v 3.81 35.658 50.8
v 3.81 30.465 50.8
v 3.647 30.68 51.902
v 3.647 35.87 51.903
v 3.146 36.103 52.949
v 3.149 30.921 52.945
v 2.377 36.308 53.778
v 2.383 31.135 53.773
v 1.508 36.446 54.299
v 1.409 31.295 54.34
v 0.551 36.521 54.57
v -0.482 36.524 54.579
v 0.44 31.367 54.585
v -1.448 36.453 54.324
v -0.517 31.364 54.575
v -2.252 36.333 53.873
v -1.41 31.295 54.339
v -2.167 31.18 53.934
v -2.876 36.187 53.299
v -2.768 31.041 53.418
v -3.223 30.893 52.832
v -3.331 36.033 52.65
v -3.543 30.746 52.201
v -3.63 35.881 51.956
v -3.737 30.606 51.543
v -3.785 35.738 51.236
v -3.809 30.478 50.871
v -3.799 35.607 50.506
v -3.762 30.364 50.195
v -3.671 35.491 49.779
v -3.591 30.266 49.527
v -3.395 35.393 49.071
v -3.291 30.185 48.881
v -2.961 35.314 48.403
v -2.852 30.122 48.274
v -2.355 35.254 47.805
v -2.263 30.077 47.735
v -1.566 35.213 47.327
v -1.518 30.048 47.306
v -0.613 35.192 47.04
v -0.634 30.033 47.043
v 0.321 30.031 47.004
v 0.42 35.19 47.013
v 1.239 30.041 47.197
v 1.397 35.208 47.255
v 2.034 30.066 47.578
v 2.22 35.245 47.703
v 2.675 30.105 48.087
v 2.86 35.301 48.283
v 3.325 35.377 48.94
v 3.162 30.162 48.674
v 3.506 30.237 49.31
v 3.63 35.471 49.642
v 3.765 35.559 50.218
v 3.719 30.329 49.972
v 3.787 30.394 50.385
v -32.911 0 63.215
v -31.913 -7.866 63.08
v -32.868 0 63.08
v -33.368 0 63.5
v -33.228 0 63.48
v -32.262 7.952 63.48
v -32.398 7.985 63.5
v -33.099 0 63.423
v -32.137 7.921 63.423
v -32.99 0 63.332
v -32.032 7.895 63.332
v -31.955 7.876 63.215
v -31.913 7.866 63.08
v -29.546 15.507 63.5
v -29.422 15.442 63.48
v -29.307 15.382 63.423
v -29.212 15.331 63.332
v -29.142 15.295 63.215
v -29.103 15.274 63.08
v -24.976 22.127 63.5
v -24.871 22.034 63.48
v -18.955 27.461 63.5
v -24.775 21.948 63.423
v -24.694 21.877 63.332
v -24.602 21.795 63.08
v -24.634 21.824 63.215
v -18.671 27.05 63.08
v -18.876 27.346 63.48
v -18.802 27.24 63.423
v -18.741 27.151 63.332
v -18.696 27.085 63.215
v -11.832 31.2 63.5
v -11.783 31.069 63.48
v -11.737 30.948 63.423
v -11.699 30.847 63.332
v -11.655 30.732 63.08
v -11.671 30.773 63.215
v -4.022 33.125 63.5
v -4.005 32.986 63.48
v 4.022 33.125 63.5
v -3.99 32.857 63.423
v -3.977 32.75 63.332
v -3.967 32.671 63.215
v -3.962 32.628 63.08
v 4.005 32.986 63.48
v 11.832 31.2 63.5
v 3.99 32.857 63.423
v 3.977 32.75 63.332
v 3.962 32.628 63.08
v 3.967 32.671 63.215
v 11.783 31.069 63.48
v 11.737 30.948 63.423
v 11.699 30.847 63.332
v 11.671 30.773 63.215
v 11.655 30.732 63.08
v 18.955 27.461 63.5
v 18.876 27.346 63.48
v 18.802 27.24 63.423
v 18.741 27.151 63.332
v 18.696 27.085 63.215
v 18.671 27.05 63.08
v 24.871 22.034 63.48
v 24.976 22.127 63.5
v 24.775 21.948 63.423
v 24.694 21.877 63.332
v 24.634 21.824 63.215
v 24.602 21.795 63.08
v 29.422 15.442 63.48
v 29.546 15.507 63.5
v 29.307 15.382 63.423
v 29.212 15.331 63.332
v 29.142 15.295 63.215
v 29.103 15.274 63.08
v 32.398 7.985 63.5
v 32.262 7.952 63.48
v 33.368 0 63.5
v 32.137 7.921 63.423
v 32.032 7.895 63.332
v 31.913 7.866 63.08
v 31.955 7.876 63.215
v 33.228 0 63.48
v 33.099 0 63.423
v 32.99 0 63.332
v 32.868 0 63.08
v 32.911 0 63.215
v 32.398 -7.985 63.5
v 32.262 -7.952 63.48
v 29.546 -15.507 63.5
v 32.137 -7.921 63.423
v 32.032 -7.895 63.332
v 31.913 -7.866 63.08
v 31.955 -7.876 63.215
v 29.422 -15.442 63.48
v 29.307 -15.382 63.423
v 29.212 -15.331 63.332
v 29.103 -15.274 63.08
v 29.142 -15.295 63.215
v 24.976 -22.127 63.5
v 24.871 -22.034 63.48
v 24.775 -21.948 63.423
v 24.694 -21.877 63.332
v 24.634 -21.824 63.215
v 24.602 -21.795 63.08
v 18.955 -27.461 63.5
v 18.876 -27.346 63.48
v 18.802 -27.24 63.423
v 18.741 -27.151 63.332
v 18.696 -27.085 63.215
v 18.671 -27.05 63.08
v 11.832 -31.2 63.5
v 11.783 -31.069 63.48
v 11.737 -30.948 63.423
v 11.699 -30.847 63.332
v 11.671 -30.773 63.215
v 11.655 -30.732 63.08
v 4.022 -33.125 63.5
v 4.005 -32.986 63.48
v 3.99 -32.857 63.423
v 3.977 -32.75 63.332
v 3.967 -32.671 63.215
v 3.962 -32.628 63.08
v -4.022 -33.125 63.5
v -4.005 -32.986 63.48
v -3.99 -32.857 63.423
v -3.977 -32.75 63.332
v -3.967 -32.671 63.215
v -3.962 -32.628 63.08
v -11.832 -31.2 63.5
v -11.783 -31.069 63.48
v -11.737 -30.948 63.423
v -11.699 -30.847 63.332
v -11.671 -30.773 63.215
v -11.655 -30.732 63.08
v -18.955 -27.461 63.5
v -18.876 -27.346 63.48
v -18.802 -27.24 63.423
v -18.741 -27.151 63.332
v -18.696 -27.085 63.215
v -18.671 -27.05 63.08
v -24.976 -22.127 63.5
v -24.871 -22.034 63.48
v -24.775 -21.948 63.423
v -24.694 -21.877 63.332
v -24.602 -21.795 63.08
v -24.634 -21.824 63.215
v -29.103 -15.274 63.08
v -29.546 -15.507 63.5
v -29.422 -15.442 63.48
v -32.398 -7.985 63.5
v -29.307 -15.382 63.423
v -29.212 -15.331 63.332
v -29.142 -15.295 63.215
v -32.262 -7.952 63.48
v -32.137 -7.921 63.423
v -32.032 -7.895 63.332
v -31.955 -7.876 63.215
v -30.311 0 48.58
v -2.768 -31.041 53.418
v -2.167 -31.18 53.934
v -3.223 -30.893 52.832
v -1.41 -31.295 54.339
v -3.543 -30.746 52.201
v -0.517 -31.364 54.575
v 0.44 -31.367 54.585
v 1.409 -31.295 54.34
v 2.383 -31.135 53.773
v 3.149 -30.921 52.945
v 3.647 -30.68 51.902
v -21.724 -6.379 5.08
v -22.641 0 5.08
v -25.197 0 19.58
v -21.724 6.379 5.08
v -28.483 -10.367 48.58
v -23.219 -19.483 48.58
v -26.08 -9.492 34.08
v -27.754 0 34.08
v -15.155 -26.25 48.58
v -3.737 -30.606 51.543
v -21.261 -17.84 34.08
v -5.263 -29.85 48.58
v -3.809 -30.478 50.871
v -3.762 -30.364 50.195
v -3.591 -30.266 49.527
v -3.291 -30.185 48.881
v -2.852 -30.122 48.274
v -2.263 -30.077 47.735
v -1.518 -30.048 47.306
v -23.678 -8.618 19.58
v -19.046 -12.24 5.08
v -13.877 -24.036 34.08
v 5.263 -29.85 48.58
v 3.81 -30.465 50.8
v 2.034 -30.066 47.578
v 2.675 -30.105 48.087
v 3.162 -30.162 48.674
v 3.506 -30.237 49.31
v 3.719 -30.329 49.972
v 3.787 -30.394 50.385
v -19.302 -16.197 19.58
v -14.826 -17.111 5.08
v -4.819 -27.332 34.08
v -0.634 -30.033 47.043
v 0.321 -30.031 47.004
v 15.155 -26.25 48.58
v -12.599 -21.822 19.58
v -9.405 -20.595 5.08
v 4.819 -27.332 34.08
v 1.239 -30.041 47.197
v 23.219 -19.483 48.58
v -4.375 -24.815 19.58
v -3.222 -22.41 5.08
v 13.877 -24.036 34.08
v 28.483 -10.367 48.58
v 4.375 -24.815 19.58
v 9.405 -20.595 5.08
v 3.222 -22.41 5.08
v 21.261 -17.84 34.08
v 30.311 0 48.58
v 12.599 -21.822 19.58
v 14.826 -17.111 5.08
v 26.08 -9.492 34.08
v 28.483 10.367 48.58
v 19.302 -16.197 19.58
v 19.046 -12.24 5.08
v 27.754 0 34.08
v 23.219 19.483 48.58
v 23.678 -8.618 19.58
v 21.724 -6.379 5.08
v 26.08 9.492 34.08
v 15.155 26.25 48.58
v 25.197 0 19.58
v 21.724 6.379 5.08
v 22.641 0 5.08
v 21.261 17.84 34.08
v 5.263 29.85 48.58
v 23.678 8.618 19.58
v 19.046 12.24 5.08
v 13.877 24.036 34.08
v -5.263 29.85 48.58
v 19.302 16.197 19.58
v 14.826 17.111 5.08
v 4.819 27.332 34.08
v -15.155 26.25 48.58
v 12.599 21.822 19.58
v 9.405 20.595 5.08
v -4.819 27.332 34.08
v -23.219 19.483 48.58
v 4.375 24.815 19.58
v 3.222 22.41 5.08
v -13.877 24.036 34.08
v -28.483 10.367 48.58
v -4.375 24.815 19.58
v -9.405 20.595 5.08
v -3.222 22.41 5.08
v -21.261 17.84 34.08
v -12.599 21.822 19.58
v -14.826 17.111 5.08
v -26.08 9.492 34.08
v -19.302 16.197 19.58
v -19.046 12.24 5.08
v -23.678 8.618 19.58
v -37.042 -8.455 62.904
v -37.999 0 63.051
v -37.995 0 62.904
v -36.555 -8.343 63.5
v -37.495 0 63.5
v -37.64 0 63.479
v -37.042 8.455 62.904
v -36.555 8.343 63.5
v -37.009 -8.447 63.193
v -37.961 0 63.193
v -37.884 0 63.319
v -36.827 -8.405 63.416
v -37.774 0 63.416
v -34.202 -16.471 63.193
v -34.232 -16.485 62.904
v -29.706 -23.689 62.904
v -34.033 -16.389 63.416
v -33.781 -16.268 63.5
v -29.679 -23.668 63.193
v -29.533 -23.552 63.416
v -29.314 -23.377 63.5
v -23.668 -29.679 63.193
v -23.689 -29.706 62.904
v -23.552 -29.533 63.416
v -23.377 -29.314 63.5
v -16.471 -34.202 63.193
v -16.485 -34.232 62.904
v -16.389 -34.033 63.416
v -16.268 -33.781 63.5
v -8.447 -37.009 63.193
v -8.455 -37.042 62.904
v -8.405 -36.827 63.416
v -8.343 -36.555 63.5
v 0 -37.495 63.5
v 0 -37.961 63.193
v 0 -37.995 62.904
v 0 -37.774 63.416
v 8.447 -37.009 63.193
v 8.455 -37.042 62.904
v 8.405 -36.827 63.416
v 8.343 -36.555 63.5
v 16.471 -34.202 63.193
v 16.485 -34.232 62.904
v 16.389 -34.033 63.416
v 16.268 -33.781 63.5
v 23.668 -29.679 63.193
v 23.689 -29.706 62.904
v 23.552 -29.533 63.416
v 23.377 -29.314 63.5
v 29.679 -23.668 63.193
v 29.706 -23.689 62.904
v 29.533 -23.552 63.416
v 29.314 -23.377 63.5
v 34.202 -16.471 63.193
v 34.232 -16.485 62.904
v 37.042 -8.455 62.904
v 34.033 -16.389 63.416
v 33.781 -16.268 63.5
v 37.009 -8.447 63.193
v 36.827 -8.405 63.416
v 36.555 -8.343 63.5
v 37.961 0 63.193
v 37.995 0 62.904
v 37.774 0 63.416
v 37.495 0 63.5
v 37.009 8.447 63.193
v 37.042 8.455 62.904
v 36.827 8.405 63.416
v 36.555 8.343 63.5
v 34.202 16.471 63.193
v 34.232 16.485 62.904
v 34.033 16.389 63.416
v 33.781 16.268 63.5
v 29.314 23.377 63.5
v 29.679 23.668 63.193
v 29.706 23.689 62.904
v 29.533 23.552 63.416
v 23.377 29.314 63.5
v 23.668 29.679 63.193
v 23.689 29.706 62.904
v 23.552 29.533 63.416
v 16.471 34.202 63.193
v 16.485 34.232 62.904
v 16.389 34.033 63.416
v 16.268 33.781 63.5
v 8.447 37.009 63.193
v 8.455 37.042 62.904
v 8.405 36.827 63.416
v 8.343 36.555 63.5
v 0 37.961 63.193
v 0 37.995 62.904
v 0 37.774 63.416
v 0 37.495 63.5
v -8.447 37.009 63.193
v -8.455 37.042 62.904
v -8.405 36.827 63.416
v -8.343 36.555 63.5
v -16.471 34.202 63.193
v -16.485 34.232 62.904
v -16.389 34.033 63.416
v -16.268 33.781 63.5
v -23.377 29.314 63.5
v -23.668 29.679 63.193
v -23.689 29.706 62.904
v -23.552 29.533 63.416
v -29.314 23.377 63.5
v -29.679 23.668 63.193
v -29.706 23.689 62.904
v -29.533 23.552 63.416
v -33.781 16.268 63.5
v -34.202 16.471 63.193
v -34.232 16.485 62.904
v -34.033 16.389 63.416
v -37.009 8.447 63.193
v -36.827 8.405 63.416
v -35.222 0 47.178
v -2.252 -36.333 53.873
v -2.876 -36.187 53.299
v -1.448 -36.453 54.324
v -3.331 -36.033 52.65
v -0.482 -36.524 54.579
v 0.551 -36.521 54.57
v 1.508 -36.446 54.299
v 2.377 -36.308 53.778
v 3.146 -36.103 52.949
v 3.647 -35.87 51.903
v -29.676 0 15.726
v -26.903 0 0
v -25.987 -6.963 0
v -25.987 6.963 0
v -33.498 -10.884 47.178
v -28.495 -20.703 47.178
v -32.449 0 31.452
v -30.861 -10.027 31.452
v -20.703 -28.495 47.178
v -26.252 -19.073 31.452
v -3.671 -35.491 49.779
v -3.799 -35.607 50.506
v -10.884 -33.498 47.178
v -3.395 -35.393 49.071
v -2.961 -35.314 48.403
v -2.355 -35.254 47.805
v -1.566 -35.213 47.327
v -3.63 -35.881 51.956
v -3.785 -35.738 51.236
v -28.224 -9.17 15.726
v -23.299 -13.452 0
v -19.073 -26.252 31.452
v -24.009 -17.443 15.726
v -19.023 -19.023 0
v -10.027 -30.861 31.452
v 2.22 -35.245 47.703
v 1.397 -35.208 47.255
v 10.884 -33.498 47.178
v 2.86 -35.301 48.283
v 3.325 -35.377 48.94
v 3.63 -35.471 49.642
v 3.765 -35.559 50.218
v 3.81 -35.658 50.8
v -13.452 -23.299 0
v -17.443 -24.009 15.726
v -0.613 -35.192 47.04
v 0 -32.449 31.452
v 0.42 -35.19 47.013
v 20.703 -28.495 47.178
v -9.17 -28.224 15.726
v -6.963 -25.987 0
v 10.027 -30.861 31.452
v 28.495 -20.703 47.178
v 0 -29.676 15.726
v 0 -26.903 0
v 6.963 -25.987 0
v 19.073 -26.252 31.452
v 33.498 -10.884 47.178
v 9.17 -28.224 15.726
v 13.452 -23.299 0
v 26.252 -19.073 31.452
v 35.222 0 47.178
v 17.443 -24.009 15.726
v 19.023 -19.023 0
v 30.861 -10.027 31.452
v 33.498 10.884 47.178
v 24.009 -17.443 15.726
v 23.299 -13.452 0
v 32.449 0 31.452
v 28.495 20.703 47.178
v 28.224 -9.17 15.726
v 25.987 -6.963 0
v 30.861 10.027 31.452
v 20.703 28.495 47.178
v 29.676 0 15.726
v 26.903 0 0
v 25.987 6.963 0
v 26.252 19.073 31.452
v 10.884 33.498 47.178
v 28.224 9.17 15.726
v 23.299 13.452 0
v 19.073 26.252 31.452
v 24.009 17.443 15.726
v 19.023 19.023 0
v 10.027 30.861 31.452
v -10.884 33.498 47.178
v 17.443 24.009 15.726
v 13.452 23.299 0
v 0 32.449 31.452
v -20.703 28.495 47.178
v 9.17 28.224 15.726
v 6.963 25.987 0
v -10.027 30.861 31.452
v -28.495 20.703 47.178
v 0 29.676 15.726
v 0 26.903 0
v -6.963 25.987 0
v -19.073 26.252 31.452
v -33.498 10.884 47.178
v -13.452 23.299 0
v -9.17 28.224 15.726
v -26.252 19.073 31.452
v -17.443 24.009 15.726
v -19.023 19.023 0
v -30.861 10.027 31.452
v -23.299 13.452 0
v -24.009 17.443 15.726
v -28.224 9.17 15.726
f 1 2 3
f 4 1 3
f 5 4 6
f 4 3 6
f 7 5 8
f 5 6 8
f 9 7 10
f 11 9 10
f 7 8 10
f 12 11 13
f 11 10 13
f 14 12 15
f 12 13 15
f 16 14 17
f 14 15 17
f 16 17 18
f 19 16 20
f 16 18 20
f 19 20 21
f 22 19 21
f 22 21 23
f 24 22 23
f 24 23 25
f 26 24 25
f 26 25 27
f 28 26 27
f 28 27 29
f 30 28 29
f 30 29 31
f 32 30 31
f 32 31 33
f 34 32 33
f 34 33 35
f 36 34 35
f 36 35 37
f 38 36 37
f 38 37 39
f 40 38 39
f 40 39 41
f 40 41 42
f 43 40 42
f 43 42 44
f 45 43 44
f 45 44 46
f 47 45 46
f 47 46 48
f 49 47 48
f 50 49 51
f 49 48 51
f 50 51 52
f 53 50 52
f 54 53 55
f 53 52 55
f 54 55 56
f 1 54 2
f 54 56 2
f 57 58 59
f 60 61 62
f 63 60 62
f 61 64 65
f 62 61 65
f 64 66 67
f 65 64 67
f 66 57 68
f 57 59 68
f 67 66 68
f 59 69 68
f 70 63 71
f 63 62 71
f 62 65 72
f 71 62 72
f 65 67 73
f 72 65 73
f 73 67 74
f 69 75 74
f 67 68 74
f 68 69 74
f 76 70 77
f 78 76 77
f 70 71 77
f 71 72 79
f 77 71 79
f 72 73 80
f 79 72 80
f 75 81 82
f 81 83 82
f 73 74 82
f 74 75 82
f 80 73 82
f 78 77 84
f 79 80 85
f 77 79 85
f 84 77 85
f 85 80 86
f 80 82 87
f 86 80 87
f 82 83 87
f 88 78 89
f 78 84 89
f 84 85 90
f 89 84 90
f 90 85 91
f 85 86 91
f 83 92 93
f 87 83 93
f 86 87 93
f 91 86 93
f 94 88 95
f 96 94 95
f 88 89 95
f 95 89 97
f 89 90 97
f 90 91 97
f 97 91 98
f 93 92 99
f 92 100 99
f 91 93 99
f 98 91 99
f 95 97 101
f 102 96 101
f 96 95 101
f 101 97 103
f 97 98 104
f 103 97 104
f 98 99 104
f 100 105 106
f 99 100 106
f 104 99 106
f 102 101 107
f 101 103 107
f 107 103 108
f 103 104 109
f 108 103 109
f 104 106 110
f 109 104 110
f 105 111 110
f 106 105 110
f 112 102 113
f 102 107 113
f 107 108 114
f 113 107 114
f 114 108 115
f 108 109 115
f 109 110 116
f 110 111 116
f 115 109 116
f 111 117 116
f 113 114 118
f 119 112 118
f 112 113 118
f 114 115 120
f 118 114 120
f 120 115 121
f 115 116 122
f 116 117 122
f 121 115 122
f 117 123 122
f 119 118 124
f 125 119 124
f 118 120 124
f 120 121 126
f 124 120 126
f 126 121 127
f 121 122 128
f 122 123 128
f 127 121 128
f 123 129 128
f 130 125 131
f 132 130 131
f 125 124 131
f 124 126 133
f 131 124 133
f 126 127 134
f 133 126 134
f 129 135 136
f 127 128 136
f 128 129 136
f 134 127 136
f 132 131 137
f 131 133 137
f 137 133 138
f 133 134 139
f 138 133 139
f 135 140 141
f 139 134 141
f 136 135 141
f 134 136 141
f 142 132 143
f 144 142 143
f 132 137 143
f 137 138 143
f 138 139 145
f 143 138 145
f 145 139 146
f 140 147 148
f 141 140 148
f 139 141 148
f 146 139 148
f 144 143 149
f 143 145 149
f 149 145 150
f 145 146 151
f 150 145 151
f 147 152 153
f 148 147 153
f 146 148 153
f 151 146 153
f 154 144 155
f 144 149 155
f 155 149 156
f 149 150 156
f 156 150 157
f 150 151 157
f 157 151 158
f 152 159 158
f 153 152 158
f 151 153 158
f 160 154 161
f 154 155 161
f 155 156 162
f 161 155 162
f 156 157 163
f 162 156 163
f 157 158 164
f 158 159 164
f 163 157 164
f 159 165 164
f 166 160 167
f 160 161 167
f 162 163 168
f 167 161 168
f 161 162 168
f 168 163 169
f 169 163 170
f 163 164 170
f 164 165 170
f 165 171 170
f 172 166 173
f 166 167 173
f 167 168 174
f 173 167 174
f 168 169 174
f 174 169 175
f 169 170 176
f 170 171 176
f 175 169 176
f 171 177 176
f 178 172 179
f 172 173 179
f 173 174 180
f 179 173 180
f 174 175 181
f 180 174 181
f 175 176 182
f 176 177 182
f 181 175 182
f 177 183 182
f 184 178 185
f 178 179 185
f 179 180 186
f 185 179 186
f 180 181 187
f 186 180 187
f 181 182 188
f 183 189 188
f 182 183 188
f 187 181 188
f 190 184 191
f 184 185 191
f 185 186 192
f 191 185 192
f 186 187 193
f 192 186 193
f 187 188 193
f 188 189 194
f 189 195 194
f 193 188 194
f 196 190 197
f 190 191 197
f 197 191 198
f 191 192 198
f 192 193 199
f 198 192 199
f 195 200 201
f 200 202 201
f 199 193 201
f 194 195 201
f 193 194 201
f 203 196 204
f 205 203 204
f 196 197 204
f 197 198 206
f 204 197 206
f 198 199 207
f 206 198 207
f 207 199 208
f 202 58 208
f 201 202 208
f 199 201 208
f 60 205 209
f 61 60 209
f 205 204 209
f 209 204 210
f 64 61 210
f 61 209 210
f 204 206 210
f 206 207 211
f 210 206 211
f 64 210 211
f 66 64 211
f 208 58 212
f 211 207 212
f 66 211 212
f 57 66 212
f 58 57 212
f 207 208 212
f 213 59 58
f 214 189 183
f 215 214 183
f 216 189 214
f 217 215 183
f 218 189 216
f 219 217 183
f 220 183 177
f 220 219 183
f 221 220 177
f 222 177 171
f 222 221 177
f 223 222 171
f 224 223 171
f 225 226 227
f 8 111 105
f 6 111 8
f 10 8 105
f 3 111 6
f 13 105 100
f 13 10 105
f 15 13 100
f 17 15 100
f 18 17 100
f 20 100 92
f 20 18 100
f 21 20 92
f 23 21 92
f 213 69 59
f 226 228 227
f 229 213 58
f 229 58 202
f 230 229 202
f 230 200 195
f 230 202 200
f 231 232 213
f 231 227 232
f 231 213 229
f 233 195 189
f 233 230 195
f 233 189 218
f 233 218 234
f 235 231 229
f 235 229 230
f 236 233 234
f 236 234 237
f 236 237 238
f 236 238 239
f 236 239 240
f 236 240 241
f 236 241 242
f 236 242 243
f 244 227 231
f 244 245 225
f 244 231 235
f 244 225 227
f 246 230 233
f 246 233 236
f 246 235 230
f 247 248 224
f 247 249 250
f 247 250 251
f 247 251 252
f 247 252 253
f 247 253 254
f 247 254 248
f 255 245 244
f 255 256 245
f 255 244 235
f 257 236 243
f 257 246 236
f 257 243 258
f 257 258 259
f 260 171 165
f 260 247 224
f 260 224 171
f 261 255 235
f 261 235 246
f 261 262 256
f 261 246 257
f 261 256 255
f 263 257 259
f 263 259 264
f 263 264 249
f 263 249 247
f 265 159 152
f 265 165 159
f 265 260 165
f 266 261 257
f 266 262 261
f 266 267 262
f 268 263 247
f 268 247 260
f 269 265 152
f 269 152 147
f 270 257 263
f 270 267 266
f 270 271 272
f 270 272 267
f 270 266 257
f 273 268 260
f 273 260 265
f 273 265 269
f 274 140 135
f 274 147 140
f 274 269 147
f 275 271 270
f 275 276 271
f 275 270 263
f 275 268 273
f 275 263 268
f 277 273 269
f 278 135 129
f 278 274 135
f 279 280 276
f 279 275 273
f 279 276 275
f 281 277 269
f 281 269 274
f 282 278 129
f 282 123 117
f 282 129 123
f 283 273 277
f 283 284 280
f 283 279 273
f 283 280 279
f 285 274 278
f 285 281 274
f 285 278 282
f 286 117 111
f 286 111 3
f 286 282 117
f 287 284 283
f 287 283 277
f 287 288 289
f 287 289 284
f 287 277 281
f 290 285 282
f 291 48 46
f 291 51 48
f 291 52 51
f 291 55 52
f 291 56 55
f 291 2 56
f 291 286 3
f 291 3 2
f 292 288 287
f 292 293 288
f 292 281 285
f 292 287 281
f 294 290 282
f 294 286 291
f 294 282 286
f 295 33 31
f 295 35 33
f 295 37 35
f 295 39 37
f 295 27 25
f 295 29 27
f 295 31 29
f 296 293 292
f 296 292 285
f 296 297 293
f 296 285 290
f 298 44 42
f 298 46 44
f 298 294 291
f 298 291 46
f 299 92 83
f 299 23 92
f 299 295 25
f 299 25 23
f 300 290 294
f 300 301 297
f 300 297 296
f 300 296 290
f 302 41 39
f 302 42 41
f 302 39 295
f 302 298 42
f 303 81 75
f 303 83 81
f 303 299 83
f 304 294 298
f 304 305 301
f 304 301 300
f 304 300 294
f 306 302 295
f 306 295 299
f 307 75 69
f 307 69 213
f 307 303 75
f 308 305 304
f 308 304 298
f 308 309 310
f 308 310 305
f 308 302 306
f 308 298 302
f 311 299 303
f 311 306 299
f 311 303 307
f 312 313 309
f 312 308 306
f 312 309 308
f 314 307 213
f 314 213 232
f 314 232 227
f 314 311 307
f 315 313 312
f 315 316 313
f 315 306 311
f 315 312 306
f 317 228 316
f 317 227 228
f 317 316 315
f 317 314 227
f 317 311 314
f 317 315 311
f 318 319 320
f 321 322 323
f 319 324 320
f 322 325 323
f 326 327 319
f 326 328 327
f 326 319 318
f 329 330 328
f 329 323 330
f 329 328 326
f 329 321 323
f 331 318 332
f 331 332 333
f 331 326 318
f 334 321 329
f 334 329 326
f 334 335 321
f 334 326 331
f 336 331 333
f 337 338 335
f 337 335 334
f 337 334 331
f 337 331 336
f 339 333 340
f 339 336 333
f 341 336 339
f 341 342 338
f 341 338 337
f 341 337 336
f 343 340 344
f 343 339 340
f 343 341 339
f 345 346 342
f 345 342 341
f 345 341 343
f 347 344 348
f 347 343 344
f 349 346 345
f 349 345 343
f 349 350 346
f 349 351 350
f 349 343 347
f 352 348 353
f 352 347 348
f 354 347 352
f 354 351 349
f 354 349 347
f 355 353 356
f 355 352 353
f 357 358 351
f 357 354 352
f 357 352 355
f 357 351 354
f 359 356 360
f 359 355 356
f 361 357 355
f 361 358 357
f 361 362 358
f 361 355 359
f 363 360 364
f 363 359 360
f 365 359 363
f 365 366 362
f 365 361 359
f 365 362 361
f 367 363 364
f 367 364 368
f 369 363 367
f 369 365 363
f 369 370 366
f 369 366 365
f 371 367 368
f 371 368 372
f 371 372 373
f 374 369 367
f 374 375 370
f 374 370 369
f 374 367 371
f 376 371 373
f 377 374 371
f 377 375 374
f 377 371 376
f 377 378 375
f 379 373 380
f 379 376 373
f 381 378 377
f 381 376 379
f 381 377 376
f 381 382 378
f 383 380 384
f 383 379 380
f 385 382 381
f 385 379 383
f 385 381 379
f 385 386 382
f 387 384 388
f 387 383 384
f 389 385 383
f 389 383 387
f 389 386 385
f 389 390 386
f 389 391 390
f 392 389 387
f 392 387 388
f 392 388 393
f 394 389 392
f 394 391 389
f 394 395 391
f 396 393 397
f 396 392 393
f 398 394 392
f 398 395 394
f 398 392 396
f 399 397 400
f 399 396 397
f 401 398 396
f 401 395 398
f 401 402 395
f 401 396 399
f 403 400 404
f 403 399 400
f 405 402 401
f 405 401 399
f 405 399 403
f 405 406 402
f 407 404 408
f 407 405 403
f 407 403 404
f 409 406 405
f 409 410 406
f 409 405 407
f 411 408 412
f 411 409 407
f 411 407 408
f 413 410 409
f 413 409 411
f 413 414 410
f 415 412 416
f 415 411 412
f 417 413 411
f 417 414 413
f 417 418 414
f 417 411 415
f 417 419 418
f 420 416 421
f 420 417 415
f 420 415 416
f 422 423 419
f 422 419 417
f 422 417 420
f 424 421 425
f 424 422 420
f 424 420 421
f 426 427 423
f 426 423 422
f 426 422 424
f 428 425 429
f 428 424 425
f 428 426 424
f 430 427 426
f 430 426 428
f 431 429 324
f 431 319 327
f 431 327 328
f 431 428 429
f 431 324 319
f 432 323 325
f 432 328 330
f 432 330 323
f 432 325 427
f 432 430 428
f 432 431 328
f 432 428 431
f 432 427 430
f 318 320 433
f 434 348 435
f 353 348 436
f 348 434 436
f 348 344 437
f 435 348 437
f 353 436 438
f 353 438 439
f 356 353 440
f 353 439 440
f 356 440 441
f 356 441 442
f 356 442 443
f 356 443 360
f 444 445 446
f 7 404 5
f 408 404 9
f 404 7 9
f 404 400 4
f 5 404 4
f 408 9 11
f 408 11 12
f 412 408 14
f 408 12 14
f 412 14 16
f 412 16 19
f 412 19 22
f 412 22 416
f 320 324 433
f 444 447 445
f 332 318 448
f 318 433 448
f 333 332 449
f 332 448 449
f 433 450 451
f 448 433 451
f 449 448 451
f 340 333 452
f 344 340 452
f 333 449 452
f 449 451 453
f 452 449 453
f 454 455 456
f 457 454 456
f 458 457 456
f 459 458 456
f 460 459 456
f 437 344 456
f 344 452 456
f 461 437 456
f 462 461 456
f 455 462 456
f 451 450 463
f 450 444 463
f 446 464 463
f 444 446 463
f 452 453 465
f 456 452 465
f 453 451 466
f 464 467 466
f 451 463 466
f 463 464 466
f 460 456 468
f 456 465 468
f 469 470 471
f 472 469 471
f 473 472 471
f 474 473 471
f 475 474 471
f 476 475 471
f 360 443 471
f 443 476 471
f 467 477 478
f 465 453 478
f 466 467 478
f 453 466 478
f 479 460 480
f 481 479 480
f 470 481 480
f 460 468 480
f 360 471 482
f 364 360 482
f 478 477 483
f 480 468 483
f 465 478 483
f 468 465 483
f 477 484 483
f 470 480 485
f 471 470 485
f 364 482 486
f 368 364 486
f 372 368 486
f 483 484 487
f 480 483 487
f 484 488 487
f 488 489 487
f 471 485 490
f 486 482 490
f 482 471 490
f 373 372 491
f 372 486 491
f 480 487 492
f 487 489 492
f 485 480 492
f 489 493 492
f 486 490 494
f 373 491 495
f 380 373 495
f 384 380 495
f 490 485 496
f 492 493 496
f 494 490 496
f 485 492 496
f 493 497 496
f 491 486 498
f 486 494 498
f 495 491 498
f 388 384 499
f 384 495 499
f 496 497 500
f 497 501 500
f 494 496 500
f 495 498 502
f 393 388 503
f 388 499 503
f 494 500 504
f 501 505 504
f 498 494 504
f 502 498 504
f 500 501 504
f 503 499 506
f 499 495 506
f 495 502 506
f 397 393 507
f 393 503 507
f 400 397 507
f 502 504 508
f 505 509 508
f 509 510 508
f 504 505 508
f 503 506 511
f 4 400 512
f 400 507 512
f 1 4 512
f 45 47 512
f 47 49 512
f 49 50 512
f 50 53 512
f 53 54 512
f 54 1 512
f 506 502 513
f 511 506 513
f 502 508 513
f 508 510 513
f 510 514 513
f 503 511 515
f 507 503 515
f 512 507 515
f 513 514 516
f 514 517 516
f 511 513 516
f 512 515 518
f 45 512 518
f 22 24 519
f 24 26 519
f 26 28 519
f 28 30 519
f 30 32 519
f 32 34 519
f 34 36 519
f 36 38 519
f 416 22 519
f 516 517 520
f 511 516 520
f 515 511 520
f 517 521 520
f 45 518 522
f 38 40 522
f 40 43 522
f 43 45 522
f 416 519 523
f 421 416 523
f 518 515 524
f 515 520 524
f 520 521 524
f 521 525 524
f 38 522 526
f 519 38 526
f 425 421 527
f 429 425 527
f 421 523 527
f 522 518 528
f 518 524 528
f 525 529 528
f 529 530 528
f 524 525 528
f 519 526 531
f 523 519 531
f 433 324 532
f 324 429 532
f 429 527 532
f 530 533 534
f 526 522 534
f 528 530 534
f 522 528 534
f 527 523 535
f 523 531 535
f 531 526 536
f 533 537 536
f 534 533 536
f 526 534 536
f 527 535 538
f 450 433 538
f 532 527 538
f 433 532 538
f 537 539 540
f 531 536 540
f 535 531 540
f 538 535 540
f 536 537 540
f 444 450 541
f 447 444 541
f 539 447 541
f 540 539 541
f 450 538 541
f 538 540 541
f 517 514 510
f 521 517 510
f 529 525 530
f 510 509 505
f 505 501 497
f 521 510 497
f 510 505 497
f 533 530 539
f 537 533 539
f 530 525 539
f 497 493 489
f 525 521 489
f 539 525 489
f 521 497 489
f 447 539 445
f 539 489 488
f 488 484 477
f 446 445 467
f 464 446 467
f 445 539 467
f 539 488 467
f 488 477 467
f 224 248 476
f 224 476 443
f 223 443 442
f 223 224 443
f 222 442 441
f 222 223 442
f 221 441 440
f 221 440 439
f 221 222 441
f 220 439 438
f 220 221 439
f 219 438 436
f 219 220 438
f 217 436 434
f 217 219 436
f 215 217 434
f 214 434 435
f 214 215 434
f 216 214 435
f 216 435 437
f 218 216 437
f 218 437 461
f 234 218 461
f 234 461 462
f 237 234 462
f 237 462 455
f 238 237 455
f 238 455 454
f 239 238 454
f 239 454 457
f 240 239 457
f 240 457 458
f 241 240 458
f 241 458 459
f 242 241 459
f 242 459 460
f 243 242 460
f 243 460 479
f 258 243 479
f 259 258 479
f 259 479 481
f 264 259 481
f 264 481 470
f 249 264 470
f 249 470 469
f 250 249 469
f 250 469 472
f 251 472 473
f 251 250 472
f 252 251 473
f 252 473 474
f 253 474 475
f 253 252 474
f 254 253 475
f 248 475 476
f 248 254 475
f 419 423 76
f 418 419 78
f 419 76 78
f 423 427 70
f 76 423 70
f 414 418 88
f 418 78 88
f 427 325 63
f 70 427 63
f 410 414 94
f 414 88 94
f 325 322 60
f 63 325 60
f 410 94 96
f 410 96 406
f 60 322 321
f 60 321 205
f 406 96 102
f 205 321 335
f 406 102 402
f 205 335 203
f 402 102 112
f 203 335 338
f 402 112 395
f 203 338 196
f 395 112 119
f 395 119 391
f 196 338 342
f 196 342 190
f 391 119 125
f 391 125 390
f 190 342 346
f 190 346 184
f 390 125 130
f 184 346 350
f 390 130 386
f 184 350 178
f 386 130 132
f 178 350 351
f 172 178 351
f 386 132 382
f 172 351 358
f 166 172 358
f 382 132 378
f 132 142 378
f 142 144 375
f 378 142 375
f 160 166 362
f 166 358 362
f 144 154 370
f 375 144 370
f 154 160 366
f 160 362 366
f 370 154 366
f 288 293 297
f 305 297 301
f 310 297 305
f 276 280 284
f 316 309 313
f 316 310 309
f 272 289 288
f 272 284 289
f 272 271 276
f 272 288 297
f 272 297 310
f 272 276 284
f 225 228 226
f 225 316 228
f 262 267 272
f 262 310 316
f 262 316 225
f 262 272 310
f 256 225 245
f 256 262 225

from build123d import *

# Parameters (mm, degrees)
F2_T     = -5.08
F3_R     = 3.81
F4_DEPTH = 254
F5_DEPTH = 254
F6_R     = 0.508


with BuildPart() as f1:
    # F0 (on Front) → F1 (revolve)
    with BuildSketch(Plane.XZ):
        Polygon((0, 0), (0, 63.5), (-38.1, 63.5), (-26.903236725, 0), align=None)
    revolve(axis=Axis((0, 0, 31.75), (0, 0, 1)))

    # F2
    f2_openings = [f1.faces().sort_by_distance(p)[0] for p in [
        (0, 0, 63.5),
    ]]
    offset(amount=F2_T, openings=f2_openings)

    # F3 (on Front) → F4 (cut)
    with BuildSketch(Plane.XZ):
        with Locations((0, 50.8)):
            Circle(F3_R)
    extrude(amount=-F4_DEPTH, mode=Mode.SUBTRACT)

    # F3 (on Front) → F5 (cut)
    with BuildSketch(Plane.XZ):
        with Locations((0, 50.8)):
            Circle(F3_R)
    extrude(amount=F5_DEPTH, mode=Mode.SUBTRACT)

    # F6
    f6_edges = [f1.edges().sort_by_distance(p)[0] for p in [
        (38.1, 0, 63.5),
        (32.941633, 0, 63.5),
    ]]
    fillet(f6_edges, radius=F6_R)


solid = f1.part
